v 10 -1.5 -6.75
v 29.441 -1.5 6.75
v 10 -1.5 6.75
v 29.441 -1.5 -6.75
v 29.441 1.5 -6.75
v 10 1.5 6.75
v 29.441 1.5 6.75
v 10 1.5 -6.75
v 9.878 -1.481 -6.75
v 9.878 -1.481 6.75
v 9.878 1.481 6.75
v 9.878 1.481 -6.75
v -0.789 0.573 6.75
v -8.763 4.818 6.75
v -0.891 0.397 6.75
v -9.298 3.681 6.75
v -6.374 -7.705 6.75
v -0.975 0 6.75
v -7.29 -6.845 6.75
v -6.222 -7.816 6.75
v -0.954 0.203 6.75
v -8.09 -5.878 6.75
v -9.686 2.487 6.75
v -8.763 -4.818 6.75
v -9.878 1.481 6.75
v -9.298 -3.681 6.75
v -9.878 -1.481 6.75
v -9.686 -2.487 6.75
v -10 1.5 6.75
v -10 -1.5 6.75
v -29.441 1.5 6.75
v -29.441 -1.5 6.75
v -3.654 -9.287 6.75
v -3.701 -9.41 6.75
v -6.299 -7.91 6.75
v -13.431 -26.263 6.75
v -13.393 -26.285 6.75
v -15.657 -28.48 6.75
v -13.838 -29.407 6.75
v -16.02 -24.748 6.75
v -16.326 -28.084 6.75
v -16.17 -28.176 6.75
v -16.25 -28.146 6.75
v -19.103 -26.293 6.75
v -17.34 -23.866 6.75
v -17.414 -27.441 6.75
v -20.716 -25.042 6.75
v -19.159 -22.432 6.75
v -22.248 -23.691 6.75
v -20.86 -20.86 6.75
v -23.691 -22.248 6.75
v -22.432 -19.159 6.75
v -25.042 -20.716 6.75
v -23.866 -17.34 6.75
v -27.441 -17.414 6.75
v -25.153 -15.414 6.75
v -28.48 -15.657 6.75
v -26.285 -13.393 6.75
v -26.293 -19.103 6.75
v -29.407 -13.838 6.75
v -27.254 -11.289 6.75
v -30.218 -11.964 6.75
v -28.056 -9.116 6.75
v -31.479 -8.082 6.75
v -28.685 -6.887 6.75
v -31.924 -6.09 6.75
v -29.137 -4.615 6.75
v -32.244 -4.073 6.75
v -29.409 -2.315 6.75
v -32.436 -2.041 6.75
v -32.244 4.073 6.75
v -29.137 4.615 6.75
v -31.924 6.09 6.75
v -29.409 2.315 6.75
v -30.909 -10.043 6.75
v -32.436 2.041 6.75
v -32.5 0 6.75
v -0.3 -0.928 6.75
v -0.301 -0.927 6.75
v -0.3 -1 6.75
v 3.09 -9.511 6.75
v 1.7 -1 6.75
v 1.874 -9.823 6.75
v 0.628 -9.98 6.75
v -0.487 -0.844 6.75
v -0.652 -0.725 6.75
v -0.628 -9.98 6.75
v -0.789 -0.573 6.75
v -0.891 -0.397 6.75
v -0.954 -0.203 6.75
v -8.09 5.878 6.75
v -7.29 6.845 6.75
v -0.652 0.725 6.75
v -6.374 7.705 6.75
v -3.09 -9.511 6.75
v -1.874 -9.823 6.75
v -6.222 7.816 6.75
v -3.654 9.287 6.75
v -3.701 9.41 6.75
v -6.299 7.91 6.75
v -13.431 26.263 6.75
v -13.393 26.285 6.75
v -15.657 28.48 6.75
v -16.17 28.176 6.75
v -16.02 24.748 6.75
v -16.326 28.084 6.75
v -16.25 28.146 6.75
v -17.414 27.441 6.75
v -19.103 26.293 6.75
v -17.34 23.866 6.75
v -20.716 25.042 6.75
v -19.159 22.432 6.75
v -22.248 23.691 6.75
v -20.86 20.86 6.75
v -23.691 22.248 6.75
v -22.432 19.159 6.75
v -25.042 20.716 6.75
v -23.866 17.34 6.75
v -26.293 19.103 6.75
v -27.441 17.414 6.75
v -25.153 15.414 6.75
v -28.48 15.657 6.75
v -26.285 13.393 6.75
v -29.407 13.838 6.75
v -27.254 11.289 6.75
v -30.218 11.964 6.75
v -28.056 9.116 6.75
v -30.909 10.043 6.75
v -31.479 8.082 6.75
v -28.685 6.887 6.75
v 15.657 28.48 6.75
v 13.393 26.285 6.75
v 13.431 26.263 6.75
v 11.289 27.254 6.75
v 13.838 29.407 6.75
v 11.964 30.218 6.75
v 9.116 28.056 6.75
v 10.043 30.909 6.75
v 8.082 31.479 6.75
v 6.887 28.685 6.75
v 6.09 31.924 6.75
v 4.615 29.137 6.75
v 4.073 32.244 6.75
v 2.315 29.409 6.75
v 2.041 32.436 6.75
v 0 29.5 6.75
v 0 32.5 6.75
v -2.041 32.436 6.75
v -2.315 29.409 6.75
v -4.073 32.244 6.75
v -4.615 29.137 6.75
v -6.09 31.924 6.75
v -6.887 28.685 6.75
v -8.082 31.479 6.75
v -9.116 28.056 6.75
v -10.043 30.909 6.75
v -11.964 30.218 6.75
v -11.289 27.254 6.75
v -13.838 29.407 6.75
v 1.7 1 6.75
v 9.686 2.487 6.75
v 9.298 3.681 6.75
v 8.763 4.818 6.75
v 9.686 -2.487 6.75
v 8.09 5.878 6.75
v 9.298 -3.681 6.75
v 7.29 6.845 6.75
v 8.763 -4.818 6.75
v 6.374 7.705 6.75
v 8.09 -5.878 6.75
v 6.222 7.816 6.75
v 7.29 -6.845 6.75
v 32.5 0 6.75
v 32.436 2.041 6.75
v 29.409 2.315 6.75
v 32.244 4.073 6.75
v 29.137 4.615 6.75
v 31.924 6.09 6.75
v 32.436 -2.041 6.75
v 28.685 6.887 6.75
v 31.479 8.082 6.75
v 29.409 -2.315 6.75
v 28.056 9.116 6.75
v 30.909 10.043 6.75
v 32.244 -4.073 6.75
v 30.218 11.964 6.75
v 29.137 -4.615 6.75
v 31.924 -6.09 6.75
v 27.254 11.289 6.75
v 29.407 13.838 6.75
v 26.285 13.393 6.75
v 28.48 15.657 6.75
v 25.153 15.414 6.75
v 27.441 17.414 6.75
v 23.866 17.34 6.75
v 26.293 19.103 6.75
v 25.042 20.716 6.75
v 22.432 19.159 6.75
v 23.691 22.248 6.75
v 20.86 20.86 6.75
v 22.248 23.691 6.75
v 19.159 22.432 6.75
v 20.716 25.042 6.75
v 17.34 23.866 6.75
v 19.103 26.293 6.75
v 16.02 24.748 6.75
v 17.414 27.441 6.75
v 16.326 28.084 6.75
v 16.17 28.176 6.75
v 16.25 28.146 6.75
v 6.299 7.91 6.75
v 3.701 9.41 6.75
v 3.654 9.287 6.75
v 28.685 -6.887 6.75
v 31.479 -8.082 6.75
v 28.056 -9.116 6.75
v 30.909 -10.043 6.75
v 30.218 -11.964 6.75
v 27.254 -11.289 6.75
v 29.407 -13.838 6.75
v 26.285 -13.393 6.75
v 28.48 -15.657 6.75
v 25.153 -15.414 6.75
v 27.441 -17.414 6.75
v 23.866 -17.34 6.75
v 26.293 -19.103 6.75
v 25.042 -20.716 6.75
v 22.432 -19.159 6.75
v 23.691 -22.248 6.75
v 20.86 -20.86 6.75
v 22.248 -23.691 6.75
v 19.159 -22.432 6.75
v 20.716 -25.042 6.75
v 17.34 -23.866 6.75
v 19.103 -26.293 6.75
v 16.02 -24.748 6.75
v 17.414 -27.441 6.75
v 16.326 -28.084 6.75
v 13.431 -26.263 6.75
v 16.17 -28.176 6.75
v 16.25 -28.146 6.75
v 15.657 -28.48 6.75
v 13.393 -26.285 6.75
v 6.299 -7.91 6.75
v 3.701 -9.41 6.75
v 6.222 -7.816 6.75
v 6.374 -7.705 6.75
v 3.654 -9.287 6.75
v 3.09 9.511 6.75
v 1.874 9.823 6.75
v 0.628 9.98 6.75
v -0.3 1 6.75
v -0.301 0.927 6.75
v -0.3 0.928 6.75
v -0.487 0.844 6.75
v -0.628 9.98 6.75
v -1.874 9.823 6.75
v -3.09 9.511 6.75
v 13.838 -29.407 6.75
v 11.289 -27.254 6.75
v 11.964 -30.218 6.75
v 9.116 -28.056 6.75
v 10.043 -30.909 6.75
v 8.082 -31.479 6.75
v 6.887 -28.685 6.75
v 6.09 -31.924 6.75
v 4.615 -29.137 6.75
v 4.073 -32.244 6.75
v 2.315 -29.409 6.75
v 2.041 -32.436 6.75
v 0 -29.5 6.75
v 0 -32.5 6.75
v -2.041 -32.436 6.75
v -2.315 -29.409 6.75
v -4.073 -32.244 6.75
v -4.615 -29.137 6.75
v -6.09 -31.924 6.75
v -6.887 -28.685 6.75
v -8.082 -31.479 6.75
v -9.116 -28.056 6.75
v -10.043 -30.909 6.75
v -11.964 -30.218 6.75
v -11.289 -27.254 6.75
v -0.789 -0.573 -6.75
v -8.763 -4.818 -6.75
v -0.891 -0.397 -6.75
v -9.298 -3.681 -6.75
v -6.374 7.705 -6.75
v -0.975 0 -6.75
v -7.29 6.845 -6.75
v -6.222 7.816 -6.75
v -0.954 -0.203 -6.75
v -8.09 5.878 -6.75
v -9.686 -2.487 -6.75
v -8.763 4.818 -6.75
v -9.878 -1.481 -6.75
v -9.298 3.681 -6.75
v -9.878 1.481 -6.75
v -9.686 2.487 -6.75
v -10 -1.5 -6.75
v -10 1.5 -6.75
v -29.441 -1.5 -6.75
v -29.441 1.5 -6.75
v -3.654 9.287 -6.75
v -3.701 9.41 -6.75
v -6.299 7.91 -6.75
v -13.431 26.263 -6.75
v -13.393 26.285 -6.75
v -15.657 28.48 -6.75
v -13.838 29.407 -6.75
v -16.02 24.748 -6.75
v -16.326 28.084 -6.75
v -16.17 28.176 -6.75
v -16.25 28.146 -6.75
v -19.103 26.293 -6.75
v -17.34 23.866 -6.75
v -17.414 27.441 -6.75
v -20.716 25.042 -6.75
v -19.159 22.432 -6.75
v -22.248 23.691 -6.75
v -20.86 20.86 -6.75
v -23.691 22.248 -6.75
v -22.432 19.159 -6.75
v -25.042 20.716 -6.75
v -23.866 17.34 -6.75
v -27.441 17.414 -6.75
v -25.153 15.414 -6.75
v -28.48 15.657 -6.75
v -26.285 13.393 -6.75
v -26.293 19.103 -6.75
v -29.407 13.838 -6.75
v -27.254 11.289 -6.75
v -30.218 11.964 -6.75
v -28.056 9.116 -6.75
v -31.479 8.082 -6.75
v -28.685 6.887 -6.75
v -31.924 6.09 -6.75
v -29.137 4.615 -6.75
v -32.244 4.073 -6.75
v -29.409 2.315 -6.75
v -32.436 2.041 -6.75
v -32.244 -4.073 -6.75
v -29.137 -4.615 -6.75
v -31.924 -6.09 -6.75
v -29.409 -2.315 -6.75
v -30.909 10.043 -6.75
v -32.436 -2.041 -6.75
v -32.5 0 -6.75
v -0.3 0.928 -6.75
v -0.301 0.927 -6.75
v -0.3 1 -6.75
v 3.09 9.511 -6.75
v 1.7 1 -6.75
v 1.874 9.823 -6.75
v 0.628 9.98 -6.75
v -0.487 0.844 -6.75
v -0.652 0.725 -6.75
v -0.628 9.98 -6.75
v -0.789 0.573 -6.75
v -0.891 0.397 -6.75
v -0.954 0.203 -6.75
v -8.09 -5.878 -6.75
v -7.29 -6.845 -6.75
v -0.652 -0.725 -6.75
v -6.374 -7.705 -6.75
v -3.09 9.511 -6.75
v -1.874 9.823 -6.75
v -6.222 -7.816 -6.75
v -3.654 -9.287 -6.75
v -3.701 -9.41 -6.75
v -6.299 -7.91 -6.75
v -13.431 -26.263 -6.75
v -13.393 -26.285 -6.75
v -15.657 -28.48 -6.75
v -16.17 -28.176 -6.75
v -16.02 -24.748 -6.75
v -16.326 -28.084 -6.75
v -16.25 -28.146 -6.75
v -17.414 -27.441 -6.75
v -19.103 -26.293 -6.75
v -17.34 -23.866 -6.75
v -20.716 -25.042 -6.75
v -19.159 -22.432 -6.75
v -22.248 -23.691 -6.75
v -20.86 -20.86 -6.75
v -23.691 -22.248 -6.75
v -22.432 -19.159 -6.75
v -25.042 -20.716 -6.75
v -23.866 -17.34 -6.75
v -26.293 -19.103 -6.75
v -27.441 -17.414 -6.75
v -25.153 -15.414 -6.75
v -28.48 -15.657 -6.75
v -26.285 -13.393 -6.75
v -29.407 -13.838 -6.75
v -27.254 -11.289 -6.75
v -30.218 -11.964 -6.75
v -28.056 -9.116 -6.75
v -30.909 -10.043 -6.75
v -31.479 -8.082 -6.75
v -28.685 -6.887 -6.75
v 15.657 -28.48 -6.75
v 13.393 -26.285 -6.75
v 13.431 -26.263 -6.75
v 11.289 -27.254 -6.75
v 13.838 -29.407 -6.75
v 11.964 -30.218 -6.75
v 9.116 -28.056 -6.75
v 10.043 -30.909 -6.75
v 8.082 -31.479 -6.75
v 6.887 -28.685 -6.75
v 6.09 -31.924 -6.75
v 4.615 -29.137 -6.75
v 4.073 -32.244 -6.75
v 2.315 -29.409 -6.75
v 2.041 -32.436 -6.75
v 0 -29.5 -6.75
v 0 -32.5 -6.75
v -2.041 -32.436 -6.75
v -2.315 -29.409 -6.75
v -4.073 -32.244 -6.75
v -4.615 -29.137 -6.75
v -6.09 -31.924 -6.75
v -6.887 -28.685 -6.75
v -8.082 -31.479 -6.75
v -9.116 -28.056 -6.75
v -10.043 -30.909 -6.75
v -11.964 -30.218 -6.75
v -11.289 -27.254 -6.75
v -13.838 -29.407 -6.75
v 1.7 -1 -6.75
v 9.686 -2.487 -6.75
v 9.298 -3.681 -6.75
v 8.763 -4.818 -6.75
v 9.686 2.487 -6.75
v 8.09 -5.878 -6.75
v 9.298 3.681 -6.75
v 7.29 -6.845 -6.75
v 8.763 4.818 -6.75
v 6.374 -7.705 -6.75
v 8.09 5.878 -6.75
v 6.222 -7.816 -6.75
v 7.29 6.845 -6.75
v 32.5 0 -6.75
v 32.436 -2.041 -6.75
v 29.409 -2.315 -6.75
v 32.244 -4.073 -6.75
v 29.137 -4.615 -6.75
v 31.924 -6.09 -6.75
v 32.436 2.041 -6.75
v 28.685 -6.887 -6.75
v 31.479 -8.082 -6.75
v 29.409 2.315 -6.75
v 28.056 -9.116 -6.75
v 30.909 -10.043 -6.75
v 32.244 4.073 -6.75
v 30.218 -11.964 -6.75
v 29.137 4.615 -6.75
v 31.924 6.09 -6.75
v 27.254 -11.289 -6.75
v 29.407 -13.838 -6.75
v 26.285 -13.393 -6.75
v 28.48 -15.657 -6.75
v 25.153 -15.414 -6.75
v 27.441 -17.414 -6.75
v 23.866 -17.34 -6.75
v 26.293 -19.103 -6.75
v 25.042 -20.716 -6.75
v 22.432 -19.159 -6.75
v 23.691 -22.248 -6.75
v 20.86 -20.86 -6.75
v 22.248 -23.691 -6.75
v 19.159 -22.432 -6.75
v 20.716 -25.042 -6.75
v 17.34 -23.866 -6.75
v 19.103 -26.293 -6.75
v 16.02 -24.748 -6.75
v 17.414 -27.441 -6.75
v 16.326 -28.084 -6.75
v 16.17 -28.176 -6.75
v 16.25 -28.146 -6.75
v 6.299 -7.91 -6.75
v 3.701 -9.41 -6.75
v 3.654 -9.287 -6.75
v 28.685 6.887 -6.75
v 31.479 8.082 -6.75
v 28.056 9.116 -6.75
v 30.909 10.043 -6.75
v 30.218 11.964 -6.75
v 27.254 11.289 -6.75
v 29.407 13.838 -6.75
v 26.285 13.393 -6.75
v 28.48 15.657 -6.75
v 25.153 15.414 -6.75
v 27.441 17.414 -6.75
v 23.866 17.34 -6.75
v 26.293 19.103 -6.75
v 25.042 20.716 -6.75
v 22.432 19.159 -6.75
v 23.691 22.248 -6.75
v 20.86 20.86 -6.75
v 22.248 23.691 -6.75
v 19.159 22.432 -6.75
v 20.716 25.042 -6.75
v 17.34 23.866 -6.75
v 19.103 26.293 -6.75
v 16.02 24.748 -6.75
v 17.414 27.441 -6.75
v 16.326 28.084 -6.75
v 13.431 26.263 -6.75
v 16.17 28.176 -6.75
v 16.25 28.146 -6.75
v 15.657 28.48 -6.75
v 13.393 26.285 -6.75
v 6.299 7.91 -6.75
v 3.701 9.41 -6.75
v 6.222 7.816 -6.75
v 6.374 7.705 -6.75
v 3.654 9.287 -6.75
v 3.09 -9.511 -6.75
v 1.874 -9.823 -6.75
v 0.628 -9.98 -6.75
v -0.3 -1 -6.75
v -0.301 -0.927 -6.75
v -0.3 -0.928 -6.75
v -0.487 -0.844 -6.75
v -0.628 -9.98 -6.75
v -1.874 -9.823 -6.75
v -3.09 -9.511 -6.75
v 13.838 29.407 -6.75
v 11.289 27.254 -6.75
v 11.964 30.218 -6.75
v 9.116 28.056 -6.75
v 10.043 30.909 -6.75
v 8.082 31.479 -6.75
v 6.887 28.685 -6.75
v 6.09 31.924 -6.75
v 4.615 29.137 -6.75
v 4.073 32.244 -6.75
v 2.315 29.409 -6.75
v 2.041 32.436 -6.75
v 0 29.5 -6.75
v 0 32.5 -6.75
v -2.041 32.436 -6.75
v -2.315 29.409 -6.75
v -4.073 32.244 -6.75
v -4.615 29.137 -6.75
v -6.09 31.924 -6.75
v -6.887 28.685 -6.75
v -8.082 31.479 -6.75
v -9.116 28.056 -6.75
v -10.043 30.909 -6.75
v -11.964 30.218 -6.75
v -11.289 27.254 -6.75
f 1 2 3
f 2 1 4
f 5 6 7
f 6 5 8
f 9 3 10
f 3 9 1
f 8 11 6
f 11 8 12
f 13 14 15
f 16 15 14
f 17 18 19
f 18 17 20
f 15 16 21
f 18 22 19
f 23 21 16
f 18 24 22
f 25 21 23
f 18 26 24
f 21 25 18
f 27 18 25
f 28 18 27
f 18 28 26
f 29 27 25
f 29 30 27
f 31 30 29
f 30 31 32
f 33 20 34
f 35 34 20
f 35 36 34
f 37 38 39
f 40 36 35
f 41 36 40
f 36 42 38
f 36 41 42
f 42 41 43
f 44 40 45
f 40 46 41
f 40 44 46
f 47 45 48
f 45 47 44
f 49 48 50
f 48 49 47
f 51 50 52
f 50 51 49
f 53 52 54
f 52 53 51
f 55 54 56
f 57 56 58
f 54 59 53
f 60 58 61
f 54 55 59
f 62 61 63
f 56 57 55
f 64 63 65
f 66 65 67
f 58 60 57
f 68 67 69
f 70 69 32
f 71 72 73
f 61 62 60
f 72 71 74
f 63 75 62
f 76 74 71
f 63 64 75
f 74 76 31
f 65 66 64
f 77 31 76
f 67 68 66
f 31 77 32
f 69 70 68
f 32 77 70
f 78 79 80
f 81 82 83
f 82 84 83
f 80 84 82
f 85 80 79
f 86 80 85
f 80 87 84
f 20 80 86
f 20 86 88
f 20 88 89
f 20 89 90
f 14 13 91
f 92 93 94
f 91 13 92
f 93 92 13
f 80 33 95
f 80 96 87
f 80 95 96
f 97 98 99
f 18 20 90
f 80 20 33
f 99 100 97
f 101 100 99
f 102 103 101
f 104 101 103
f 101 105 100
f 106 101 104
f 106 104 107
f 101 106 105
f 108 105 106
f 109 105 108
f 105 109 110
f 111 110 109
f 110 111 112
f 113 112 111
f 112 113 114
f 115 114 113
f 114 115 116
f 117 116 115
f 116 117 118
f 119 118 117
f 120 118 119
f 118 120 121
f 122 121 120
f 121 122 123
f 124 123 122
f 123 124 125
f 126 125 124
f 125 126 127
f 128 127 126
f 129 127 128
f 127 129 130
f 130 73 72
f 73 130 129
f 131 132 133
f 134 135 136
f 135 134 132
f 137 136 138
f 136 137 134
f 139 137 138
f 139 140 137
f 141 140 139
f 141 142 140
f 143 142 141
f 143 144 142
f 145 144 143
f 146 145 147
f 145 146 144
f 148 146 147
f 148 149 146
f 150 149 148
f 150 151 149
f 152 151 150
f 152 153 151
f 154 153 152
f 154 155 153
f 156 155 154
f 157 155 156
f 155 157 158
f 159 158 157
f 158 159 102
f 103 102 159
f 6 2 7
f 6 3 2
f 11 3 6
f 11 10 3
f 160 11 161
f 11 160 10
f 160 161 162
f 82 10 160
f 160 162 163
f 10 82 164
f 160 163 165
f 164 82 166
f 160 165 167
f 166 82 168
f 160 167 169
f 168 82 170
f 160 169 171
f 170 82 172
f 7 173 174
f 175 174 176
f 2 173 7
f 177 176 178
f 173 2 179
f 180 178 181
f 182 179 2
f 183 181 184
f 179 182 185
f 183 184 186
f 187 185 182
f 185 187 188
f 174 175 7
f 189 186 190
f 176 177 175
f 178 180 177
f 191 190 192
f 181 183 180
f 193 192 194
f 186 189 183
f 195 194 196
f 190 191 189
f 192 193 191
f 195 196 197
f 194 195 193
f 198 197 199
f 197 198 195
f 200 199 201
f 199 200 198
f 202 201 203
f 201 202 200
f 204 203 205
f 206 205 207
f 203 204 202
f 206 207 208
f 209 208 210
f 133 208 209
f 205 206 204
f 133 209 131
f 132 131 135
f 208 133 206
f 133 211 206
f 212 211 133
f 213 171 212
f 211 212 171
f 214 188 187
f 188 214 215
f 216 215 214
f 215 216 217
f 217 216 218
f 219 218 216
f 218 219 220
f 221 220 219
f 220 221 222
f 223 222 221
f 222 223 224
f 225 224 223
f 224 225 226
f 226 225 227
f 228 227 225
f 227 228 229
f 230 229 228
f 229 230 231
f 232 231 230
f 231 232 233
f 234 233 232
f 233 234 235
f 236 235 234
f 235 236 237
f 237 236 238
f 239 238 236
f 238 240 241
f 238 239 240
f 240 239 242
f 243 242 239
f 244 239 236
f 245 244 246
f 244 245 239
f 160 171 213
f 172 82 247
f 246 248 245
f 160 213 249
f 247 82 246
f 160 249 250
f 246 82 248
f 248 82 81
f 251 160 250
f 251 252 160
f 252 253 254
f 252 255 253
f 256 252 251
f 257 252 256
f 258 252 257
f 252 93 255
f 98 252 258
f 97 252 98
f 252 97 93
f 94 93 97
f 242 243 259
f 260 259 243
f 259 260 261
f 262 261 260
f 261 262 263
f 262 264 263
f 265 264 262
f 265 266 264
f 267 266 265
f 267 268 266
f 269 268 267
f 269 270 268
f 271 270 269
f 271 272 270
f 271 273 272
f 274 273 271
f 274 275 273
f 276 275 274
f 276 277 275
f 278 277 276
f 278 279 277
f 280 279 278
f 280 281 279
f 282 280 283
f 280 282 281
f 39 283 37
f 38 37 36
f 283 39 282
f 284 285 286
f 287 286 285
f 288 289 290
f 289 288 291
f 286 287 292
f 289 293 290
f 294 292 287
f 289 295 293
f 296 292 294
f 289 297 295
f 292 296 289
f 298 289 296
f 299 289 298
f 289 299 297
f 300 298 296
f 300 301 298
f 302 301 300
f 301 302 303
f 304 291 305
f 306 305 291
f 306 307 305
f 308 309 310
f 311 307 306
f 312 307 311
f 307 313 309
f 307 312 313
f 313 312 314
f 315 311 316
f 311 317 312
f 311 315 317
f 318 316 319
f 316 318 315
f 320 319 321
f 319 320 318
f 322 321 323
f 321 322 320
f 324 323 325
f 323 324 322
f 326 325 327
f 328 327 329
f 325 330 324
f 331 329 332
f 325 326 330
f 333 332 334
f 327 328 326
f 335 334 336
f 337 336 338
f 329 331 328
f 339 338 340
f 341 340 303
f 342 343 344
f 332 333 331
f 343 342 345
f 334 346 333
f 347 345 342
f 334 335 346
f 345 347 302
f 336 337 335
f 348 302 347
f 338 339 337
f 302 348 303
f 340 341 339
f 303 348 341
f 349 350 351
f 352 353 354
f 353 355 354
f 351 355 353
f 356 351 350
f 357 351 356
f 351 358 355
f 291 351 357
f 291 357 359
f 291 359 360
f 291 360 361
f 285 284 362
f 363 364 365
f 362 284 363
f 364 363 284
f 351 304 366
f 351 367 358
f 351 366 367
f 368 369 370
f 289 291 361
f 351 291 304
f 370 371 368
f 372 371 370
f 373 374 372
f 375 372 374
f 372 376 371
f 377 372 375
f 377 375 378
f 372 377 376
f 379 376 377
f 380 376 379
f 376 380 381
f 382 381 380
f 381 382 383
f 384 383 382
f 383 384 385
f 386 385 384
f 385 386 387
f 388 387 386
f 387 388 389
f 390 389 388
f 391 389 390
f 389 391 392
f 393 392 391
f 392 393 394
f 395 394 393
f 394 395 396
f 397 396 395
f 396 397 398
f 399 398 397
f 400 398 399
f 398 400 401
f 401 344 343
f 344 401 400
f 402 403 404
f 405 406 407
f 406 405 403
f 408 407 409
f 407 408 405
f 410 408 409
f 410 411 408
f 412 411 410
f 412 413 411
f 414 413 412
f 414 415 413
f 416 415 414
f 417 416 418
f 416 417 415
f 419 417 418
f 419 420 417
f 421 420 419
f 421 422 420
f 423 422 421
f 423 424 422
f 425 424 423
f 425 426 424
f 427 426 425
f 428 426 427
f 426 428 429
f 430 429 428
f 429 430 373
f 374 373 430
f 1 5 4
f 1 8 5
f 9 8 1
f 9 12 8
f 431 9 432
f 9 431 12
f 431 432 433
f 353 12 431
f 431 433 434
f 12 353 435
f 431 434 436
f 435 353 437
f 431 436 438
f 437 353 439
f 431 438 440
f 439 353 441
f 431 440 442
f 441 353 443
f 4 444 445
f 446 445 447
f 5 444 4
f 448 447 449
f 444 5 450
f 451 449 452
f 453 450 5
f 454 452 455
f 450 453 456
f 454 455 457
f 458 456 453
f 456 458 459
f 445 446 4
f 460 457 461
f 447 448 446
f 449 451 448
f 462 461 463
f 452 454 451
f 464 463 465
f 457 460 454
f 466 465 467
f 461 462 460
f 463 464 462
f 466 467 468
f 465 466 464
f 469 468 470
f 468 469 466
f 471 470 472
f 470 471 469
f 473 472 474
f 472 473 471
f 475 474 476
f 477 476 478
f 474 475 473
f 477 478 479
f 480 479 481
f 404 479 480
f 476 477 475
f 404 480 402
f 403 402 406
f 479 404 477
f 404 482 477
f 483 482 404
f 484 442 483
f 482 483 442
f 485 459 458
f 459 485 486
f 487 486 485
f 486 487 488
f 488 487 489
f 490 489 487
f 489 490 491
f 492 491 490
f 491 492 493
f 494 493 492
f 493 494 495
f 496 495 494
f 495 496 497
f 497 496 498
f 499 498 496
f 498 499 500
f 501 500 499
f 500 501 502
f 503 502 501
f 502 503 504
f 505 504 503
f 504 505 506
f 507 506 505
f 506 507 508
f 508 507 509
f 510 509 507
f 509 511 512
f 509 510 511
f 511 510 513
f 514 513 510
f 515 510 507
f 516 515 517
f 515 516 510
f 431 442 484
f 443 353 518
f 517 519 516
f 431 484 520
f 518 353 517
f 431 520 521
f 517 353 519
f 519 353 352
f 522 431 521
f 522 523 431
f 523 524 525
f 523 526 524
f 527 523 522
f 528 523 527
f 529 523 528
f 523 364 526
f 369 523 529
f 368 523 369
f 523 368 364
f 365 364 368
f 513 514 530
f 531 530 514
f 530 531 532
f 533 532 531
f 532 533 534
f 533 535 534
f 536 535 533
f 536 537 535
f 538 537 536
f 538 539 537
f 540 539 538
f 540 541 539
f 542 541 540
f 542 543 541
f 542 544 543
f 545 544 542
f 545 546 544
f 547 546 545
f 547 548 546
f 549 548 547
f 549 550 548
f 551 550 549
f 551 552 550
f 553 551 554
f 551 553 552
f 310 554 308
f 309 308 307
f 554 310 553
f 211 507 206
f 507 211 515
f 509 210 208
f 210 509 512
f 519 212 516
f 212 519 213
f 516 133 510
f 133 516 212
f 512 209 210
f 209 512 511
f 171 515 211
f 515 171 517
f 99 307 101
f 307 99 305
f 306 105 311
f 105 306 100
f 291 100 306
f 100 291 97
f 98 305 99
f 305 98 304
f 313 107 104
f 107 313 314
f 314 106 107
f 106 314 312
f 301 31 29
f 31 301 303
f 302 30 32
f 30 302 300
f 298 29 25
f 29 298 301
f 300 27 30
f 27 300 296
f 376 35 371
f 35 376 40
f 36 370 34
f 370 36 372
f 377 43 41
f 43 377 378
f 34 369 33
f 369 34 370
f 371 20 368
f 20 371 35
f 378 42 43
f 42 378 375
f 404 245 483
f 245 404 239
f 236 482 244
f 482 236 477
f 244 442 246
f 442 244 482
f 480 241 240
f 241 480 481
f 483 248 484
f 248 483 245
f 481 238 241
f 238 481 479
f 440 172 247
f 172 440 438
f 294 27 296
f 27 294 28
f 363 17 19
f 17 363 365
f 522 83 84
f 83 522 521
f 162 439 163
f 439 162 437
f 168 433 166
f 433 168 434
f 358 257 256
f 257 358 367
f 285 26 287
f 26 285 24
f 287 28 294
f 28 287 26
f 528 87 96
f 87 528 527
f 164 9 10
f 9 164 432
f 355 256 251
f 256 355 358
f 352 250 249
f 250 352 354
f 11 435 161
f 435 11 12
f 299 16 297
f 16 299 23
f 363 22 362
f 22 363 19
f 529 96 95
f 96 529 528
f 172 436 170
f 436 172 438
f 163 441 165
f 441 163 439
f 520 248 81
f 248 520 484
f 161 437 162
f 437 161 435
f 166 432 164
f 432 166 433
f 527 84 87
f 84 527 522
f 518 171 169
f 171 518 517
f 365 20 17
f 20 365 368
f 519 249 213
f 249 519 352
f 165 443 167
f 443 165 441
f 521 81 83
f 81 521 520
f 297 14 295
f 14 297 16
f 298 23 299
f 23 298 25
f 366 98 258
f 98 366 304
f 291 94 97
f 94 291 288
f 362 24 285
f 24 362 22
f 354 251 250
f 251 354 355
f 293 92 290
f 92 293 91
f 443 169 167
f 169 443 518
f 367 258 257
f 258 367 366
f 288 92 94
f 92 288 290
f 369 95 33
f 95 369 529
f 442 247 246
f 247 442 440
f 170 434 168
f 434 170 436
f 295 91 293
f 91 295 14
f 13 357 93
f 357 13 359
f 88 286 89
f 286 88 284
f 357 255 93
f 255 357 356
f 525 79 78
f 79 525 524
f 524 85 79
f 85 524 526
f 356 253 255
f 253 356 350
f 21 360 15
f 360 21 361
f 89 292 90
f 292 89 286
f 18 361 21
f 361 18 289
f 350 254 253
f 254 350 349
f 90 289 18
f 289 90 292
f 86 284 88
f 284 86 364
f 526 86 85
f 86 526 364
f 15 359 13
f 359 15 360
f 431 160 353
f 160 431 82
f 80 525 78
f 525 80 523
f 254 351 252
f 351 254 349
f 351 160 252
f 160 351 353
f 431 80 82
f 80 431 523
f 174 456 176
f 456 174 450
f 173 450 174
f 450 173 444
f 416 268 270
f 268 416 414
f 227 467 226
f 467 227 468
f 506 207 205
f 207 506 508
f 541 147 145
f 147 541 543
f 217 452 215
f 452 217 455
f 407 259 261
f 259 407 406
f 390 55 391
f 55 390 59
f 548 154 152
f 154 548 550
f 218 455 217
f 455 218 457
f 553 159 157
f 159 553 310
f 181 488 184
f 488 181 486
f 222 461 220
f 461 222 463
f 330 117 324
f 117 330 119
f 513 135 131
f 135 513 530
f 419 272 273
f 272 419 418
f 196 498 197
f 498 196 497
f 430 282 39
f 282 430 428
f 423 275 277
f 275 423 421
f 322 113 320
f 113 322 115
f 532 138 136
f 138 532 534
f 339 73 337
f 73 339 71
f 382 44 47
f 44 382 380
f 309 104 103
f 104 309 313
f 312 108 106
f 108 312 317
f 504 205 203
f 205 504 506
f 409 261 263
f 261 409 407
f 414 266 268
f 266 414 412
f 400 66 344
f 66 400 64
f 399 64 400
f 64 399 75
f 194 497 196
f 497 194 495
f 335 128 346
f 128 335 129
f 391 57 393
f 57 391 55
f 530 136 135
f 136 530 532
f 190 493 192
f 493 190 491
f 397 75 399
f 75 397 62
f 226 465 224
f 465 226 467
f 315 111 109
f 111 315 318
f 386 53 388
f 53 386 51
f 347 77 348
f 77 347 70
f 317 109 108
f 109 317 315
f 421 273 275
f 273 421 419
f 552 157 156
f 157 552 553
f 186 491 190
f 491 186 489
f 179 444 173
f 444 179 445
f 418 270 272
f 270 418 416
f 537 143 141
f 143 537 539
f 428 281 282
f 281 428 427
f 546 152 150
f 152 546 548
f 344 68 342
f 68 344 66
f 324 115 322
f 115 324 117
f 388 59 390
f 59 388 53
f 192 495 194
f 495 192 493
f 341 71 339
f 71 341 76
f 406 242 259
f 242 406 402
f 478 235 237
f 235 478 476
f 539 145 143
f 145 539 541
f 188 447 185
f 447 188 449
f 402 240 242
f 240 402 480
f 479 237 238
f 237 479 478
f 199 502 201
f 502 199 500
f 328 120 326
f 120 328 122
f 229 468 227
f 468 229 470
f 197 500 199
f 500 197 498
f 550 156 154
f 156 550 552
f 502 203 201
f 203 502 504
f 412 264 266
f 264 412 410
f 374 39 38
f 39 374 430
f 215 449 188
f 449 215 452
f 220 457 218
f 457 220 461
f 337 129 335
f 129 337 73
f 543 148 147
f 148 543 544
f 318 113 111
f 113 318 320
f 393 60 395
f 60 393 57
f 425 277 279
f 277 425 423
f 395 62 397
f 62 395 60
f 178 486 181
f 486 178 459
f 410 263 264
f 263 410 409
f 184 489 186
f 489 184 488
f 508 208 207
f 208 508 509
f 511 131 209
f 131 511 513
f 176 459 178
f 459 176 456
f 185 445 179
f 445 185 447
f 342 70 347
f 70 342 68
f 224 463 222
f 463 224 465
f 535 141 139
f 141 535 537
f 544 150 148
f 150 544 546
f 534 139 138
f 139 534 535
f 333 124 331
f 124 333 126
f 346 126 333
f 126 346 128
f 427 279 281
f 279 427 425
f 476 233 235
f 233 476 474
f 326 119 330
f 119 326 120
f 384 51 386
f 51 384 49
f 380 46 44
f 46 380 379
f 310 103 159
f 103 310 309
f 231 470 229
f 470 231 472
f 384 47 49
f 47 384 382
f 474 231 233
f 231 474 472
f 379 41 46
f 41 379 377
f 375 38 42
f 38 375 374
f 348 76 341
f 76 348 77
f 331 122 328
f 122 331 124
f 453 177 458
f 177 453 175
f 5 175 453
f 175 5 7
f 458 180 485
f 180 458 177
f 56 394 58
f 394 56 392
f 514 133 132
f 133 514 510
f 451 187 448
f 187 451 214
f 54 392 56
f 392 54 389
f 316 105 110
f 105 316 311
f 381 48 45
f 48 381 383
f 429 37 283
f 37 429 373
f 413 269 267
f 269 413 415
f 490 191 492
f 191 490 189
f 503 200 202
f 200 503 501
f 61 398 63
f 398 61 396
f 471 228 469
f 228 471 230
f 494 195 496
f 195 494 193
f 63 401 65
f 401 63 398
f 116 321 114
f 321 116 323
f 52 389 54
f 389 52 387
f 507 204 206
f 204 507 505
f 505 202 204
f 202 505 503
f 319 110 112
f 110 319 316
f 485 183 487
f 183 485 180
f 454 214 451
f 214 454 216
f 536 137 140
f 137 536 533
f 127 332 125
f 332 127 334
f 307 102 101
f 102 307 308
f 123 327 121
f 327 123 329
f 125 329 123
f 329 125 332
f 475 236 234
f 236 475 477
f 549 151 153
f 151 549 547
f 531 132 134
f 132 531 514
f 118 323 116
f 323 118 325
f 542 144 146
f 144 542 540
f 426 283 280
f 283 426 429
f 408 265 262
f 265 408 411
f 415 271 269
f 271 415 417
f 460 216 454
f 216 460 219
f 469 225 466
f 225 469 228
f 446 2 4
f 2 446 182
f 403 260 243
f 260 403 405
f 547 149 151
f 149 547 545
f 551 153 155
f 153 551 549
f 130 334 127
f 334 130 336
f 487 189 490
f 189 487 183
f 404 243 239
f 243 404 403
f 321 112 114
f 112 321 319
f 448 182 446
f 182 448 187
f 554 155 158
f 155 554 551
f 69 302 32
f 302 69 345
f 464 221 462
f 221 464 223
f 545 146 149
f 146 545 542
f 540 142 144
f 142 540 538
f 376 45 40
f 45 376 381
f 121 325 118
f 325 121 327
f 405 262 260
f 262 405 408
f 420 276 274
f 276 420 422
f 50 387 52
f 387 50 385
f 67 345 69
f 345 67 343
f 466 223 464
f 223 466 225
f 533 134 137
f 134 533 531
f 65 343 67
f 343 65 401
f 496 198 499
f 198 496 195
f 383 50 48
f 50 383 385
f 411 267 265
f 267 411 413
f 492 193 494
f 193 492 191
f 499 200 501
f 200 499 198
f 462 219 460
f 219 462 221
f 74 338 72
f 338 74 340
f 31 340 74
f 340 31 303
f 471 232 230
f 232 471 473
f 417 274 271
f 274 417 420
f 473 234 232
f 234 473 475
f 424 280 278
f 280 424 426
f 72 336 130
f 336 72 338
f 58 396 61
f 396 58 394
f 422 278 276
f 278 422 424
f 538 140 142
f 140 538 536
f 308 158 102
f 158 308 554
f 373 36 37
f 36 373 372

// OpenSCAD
/*
 * ArloBot - 3D Printed Wheels
 *
 * Parametric OpenSCAD design for robot wheels
 * Compatible with standard hobby DC motors
 *
 * To generate STL files:
 * 1. Open in OpenSCAD
 * 2. Set 'part' variable to the part you want to export
 * 3. Press F6 to render, then Export as STL
 */

// Include MCAD library for proper involute gears
include </usr/share/openscad/libraries/MCAD/involute_gears.scad>

// ===== CONFIGURATION PARAMETERS =====

// Which part to render
part = "single_piece_wheel"; // Options: "wheel", "tire", "complete_wheel", "single_piece_wheel", "geared_wheel", "motor_pinion"

// Wheel dimensions
wheel_diameter = 65;      // Overall wheel diameter (mm)
wheel_width = 13.5;       // Total wheel width (mm)
rim_width = 10;           // Width of the plastic rim (mm)
tire_thickness = 3;       // Thickness of tire tread (mm)

// Hub dimensions
hub_diameter = 20;        // Central hub diameter (mm)
hub_height = 13.5;        // Hub height/depth (mm) - extends to wheel edge

// Motor shaft (N20 micro gear motor uses 2mm shaft)
shaft_diameter = 2;       // Motor shaft diameter (mm) - N20 standard
shaft_flat = true;        // Does shaft have a flat side? (D-shaft)
shaft_flat_depth = 0.3;   // Depth of flat on D-shaft (mm)
shaft_tolerance = -0.05;  // Negative tolerance for tight press fit
set_screw_diameter = 2;   // M2 set screw to hold wheel on shaft (smaller for 2mm shaft)
set_screw_depth = 8;      // Depth of set screw hole

// Spoke design
num_spokes = 6;           // Number of spokes (4, 5, or 6 recommended)
spoke_thickness = 3;      // Thickness of each spoke (mm)

// Tire tread
tread_style = "smooth";   // Options: "smooth", "chevron", "diamond", "circular"
tread_depth = 1;          // Depth of tread pattern (mm)
num_treads = 16;          // Number of tread elements around circumference

// Print tolerance
tolerance = 0.2;

// ===== GEAR PARAMETERS =====
// For 5:1 gear reduction system
gear_module = 1.0;           // Tooth size (mm) - standard metric module
pinion_teeth = 10;           // Motor pinion gear teeth
wheel_gear_teeth = 50;       // Wheel gear teeth
pressure_angle = 20;         // Standard pressure angle (degrees)
gear_width = 8;              // Width/thickness of gears (mm)

// Bearing parameters (for geared wheel)
bearing_od = 22;             // Bearing outer diameter (mm)
bearing_id = 8;              // Bearing inner diameter (mm)
bearing_width = 7;           // Bearing width (mm)

// Motor shaft (for pinion gear)
motor_shaft_diameter = 2;    // N20 motor shaft (mm)

// ===== RENDERING LOGIC =====

if (part == "wheel") {
    wheel_rim();
} else if (part == "tire") {
    tire();
} else if (part == "complete_wheel") {
    complete_wheel();
} else if (part == "single_piece_wheel") {
    single_piece_wheel();
} else if (part == "geared_wheel") {
    geared_wheel();
} else if (part == "motor_pinion") {
    motor_pinion();
}

// ===== MODULES =====

module complete_wheel() {
    // Complete assembly for visualization
    color("lightgray")
        wheel_rim();

    color("black")
        tire();
}

module wheel_rim() {
    difference() {
        union() {
            // Central hub
            cylinder(d=hub_diameter, h=hub_height, center=true, $fn=50);

            // Spokes
            for (i = [0:num_spokes-1]) {
                rotate([0, 0, i * 360/num_spokes])
                    spoke();
            }
        }

        // Motor shaft hole
        cylinder(d=shaft_diameter + shaft_tolerance, h=hub_height + 2, center=true, $fn=30);

        // Flat on D-shaft
        if (shaft_flat) {
            translate([shaft_diameter/2 - shaft_flat_depth, 0, 0])
                cube([shaft_diameter, shaft_diameter, hub_height + 2], center=true);
        }
    }
}

module spoke() {
    // Single spoke from hub to tire ridge (for printability without supports)
    tire_inner_radius = (wheel_diameter - tire_thickness*2) / 2;
    spoke_length = tire_inner_radius - hub_diameter/2;

    hull() {
        // Start at hub
        translate([hub_diameter/2, 0, 0])
            cylinder(d=spoke_thickness, h=wheel_width, center=true, $fn=20);

        // End at tire ridge (extend into the tire)
        translate([tire_inner_radius + tire_thickness/2, 0, 0])
            cylinder(d=spoke_thickness, h=wheel_width, center=true, $fn=20);
    }
}

module tire() {
    // Flexible tire with tread pattern
    difference() {
        // Outer tire
        cylinder(d=wheel_diameter, h=wheel_width, center=true, $fn=100);

        // Inner cavity (fits over rim)
        cylinder(d=wheel_diameter - tire_thickness*2 + tolerance, h=wheel_width + 2, center=true, $fn=80);

        // Tread pattern
        if (tread_style == "chevron") {
            chevron_tread();
        } else if (tread_style == "diamond") {
            diamond_tread();
        } else if (tread_style == "circular") {
            circular_tread();
        }
        // "smooth" has no tread cutouts
    }
}

module chevron_tread() {
    // V-shaped tread pattern
    for (i = [0:num_treads-1]) {
        rotate([0, 0, i * 360/num_treads])
            translate([wheel_diameter/2 - tread_depth/2, 0, 0])
            rotate([0, 90, 0])
            rotate([0, 0, 45])
            cube([wheel_width/3, 2, tread_depth + 1], center=true);

        rotate([0, 0, i * 360/num_treads])
            translate([wheel_diameter/2 - tread_depth/2, 0, 0])
            rotate([0, 90, 0])
            rotate([0, 0, -45])
            cube([wheel_width/3, 2, tread_depth + 1], center=true);
    }
}

module diamond_tread() {
    // Diamond-shaped tread pattern
    for (i = [0:num_treads-1]) {
        for (j = [-1, 1]) {
            rotate([0, 0, i * 360/num_treads])
                translate([wheel_diameter/2 - tread_depth/2, 0, j * wheel_width/4])
                rotate([0, 90, 0])
                rotate([0, 0, 45])
                cube([3, 3, tread_depth + 1], center=true);
        }
    }
}

module circular_tread() {
    // Circular bumps
    for (i = [0:num_treads-1]) {
        rotate([0, 0, i * 360/num_treads])
            translate([wheel_diameter/2 - tread_depth/2, 0, 0])
            rotate([0, 90, 0])
            cylinder(d=4, h=tread_depth + 1, center=true, $fn=20);
    }
}

// Alternative: Single-piece wheel with integrated tire
module single_piece_wheel() {
    difference() {
        union() {
            // Use the rim
            wheel_rim();

            // Add tire ridge instead of separate tire
            tire_ridge();
        }

        // Add tread pattern directly
        if (tread_style == "chevron") {
            chevron_tread();
        } else if (tread_style == "diamond") {
            diamond_tread();
        } else if (tread_style == "circular") {
            circular_tread();
        }
    }
}

module tire_ridge() {
    // Simple ridge around rim for single-piece design
    difference() {
        cylinder(d=wheel_diameter, h=wheel_width, center=true, $fn=100);
        cylinder(d=wheel_diameter - tire_thickness*2, h=wheel_width + 2, center=true, $fn=80);
    }
}

// ===== GEARED WHEEL COMPONENTS =====

module geared_wheel() {
    // Complete wheel assembly: 70mm spoked wheel + 50-tooth 50mm gear + 22mm bearing hole
    actual_wheel_diameter = 70;  // Actual wheel size
    gear_diameter = 50;          // 50-tooth gear pitch diameter
    wheel_thickness = 6;         // Thickness of wheel disc

    difference() {
        union() {
            // 50-tooth gear (50mm pitch diameter)
            // MCAD formula: actual_diameter = specified_module * teeth / PI
            // To get 50mm: 50 = module * 50 / PI, so module = PI
            wheel_gear_module = PI;  // Module = PI for 50mm diameter with 50 teeth
            translate([0, 0, wheel_thickness/2])
                gear(
                    number_of_teeth=wheel_gear_teeth,
                    circular_pitch=wheel_gear_module * 180 / PI,
                    gear_thickness=gear_width,
                    rim_thickness=gear_width,
                    hub_thickness=gear_width,
                    bore_diameter=bearing_od + 0.3,  // 22mm hole for bearing
                    pressure_angle=pressure_angle,
                    clearance=0.2,
                    backlash=0.2
                );

            // 70mm spoked wheel base
            difference() {
                // Outer rim
                cylinder(d=actual_wheel_diameter, h=wheel_thickness, center=true, $fn=80);

                // Hollow out center, leaving rim
                cylinder(d=actual_wheel_diameter - 8, h=wheel_thickness + 2, center=true, $fn=80);
            }

            // Hub for bearing
            cylinder(d=bearing_od + 6, h=wheel_thickness, center=true, $fn=60);

            // Spokes connecting hub to rim
            for (i = [0:5]) {
                rotate([0, 0, i * 60])
                    hull() {
                        translate([bearing_od/2 + 3, 0, 0])
                            cylinder(d=4, h=wheel_thickness, center=true, $fn=20);
                        translate([actual_wheel_diameter/2 - 4, 0, 0])
                            cylinder(d=4, h=wheel_thickness, center=true, $fn=20);
                    }
            }
        }

        // 22mm bearing hole through entire assembly
        cylinder(d=bearing_od + 0.3, h=wheel_thickness + gear_width + 4, center=true, $fn=60);

        // Set screw holes to secure to bearing
        translate([0, bearing_od/2 + 3, 0])
            rotate([90, 0, 0])
            cylinder(d=2, h=6, $fn=20);
    }
}

module motor_pinion() {
    // Small pinion gear with 10 teeth for motor shaft
    // 10 teeth with PI module gives ~10mm pitch diameter
    // Uses same module as wheel gear for proper meshing
    pinion_module = PI;  // Same module as wheel gear
    difference() {
        // Pinion gear with proper involute teeth (MCAD library)
        // 2mm bore for motor shaft
        gear(
            number_of_teeth=pinion_teeth,
            circular_pitch=pinion_module * 180 / PI,  // Same module as wheel
            gear_thickness=gear_width,
            rim_thickness=gear_width,
            hub_thickness=gear_width,
            bore_diameter=motor_shaft_diameter + 0.1,  // 2mm hole for motor shaft
            pressure_angle=pressure_angle,
            clearance=0.2,
            backlash=0.2
        );

        // Flat for D-shaft
        translate([motor_shaft_diameter/2 - 0.3, 0, 0])
            cube([motor_shaft_diameter, motor_shaft_diameter, gear_width + 2], center=true);

        // Set screw hole to secure to motor shaft
        translate([0, 0, gear_width/2 - 2])
            rotate([90, 0, 0])
            cylinder(d=2, h=8, center=true, $fn=20);
    }
}

// Note: Using MCAD library for proper involute gears
// Old simplified gear modules removed - now using gear() from MCAD/involute_gears.scad
